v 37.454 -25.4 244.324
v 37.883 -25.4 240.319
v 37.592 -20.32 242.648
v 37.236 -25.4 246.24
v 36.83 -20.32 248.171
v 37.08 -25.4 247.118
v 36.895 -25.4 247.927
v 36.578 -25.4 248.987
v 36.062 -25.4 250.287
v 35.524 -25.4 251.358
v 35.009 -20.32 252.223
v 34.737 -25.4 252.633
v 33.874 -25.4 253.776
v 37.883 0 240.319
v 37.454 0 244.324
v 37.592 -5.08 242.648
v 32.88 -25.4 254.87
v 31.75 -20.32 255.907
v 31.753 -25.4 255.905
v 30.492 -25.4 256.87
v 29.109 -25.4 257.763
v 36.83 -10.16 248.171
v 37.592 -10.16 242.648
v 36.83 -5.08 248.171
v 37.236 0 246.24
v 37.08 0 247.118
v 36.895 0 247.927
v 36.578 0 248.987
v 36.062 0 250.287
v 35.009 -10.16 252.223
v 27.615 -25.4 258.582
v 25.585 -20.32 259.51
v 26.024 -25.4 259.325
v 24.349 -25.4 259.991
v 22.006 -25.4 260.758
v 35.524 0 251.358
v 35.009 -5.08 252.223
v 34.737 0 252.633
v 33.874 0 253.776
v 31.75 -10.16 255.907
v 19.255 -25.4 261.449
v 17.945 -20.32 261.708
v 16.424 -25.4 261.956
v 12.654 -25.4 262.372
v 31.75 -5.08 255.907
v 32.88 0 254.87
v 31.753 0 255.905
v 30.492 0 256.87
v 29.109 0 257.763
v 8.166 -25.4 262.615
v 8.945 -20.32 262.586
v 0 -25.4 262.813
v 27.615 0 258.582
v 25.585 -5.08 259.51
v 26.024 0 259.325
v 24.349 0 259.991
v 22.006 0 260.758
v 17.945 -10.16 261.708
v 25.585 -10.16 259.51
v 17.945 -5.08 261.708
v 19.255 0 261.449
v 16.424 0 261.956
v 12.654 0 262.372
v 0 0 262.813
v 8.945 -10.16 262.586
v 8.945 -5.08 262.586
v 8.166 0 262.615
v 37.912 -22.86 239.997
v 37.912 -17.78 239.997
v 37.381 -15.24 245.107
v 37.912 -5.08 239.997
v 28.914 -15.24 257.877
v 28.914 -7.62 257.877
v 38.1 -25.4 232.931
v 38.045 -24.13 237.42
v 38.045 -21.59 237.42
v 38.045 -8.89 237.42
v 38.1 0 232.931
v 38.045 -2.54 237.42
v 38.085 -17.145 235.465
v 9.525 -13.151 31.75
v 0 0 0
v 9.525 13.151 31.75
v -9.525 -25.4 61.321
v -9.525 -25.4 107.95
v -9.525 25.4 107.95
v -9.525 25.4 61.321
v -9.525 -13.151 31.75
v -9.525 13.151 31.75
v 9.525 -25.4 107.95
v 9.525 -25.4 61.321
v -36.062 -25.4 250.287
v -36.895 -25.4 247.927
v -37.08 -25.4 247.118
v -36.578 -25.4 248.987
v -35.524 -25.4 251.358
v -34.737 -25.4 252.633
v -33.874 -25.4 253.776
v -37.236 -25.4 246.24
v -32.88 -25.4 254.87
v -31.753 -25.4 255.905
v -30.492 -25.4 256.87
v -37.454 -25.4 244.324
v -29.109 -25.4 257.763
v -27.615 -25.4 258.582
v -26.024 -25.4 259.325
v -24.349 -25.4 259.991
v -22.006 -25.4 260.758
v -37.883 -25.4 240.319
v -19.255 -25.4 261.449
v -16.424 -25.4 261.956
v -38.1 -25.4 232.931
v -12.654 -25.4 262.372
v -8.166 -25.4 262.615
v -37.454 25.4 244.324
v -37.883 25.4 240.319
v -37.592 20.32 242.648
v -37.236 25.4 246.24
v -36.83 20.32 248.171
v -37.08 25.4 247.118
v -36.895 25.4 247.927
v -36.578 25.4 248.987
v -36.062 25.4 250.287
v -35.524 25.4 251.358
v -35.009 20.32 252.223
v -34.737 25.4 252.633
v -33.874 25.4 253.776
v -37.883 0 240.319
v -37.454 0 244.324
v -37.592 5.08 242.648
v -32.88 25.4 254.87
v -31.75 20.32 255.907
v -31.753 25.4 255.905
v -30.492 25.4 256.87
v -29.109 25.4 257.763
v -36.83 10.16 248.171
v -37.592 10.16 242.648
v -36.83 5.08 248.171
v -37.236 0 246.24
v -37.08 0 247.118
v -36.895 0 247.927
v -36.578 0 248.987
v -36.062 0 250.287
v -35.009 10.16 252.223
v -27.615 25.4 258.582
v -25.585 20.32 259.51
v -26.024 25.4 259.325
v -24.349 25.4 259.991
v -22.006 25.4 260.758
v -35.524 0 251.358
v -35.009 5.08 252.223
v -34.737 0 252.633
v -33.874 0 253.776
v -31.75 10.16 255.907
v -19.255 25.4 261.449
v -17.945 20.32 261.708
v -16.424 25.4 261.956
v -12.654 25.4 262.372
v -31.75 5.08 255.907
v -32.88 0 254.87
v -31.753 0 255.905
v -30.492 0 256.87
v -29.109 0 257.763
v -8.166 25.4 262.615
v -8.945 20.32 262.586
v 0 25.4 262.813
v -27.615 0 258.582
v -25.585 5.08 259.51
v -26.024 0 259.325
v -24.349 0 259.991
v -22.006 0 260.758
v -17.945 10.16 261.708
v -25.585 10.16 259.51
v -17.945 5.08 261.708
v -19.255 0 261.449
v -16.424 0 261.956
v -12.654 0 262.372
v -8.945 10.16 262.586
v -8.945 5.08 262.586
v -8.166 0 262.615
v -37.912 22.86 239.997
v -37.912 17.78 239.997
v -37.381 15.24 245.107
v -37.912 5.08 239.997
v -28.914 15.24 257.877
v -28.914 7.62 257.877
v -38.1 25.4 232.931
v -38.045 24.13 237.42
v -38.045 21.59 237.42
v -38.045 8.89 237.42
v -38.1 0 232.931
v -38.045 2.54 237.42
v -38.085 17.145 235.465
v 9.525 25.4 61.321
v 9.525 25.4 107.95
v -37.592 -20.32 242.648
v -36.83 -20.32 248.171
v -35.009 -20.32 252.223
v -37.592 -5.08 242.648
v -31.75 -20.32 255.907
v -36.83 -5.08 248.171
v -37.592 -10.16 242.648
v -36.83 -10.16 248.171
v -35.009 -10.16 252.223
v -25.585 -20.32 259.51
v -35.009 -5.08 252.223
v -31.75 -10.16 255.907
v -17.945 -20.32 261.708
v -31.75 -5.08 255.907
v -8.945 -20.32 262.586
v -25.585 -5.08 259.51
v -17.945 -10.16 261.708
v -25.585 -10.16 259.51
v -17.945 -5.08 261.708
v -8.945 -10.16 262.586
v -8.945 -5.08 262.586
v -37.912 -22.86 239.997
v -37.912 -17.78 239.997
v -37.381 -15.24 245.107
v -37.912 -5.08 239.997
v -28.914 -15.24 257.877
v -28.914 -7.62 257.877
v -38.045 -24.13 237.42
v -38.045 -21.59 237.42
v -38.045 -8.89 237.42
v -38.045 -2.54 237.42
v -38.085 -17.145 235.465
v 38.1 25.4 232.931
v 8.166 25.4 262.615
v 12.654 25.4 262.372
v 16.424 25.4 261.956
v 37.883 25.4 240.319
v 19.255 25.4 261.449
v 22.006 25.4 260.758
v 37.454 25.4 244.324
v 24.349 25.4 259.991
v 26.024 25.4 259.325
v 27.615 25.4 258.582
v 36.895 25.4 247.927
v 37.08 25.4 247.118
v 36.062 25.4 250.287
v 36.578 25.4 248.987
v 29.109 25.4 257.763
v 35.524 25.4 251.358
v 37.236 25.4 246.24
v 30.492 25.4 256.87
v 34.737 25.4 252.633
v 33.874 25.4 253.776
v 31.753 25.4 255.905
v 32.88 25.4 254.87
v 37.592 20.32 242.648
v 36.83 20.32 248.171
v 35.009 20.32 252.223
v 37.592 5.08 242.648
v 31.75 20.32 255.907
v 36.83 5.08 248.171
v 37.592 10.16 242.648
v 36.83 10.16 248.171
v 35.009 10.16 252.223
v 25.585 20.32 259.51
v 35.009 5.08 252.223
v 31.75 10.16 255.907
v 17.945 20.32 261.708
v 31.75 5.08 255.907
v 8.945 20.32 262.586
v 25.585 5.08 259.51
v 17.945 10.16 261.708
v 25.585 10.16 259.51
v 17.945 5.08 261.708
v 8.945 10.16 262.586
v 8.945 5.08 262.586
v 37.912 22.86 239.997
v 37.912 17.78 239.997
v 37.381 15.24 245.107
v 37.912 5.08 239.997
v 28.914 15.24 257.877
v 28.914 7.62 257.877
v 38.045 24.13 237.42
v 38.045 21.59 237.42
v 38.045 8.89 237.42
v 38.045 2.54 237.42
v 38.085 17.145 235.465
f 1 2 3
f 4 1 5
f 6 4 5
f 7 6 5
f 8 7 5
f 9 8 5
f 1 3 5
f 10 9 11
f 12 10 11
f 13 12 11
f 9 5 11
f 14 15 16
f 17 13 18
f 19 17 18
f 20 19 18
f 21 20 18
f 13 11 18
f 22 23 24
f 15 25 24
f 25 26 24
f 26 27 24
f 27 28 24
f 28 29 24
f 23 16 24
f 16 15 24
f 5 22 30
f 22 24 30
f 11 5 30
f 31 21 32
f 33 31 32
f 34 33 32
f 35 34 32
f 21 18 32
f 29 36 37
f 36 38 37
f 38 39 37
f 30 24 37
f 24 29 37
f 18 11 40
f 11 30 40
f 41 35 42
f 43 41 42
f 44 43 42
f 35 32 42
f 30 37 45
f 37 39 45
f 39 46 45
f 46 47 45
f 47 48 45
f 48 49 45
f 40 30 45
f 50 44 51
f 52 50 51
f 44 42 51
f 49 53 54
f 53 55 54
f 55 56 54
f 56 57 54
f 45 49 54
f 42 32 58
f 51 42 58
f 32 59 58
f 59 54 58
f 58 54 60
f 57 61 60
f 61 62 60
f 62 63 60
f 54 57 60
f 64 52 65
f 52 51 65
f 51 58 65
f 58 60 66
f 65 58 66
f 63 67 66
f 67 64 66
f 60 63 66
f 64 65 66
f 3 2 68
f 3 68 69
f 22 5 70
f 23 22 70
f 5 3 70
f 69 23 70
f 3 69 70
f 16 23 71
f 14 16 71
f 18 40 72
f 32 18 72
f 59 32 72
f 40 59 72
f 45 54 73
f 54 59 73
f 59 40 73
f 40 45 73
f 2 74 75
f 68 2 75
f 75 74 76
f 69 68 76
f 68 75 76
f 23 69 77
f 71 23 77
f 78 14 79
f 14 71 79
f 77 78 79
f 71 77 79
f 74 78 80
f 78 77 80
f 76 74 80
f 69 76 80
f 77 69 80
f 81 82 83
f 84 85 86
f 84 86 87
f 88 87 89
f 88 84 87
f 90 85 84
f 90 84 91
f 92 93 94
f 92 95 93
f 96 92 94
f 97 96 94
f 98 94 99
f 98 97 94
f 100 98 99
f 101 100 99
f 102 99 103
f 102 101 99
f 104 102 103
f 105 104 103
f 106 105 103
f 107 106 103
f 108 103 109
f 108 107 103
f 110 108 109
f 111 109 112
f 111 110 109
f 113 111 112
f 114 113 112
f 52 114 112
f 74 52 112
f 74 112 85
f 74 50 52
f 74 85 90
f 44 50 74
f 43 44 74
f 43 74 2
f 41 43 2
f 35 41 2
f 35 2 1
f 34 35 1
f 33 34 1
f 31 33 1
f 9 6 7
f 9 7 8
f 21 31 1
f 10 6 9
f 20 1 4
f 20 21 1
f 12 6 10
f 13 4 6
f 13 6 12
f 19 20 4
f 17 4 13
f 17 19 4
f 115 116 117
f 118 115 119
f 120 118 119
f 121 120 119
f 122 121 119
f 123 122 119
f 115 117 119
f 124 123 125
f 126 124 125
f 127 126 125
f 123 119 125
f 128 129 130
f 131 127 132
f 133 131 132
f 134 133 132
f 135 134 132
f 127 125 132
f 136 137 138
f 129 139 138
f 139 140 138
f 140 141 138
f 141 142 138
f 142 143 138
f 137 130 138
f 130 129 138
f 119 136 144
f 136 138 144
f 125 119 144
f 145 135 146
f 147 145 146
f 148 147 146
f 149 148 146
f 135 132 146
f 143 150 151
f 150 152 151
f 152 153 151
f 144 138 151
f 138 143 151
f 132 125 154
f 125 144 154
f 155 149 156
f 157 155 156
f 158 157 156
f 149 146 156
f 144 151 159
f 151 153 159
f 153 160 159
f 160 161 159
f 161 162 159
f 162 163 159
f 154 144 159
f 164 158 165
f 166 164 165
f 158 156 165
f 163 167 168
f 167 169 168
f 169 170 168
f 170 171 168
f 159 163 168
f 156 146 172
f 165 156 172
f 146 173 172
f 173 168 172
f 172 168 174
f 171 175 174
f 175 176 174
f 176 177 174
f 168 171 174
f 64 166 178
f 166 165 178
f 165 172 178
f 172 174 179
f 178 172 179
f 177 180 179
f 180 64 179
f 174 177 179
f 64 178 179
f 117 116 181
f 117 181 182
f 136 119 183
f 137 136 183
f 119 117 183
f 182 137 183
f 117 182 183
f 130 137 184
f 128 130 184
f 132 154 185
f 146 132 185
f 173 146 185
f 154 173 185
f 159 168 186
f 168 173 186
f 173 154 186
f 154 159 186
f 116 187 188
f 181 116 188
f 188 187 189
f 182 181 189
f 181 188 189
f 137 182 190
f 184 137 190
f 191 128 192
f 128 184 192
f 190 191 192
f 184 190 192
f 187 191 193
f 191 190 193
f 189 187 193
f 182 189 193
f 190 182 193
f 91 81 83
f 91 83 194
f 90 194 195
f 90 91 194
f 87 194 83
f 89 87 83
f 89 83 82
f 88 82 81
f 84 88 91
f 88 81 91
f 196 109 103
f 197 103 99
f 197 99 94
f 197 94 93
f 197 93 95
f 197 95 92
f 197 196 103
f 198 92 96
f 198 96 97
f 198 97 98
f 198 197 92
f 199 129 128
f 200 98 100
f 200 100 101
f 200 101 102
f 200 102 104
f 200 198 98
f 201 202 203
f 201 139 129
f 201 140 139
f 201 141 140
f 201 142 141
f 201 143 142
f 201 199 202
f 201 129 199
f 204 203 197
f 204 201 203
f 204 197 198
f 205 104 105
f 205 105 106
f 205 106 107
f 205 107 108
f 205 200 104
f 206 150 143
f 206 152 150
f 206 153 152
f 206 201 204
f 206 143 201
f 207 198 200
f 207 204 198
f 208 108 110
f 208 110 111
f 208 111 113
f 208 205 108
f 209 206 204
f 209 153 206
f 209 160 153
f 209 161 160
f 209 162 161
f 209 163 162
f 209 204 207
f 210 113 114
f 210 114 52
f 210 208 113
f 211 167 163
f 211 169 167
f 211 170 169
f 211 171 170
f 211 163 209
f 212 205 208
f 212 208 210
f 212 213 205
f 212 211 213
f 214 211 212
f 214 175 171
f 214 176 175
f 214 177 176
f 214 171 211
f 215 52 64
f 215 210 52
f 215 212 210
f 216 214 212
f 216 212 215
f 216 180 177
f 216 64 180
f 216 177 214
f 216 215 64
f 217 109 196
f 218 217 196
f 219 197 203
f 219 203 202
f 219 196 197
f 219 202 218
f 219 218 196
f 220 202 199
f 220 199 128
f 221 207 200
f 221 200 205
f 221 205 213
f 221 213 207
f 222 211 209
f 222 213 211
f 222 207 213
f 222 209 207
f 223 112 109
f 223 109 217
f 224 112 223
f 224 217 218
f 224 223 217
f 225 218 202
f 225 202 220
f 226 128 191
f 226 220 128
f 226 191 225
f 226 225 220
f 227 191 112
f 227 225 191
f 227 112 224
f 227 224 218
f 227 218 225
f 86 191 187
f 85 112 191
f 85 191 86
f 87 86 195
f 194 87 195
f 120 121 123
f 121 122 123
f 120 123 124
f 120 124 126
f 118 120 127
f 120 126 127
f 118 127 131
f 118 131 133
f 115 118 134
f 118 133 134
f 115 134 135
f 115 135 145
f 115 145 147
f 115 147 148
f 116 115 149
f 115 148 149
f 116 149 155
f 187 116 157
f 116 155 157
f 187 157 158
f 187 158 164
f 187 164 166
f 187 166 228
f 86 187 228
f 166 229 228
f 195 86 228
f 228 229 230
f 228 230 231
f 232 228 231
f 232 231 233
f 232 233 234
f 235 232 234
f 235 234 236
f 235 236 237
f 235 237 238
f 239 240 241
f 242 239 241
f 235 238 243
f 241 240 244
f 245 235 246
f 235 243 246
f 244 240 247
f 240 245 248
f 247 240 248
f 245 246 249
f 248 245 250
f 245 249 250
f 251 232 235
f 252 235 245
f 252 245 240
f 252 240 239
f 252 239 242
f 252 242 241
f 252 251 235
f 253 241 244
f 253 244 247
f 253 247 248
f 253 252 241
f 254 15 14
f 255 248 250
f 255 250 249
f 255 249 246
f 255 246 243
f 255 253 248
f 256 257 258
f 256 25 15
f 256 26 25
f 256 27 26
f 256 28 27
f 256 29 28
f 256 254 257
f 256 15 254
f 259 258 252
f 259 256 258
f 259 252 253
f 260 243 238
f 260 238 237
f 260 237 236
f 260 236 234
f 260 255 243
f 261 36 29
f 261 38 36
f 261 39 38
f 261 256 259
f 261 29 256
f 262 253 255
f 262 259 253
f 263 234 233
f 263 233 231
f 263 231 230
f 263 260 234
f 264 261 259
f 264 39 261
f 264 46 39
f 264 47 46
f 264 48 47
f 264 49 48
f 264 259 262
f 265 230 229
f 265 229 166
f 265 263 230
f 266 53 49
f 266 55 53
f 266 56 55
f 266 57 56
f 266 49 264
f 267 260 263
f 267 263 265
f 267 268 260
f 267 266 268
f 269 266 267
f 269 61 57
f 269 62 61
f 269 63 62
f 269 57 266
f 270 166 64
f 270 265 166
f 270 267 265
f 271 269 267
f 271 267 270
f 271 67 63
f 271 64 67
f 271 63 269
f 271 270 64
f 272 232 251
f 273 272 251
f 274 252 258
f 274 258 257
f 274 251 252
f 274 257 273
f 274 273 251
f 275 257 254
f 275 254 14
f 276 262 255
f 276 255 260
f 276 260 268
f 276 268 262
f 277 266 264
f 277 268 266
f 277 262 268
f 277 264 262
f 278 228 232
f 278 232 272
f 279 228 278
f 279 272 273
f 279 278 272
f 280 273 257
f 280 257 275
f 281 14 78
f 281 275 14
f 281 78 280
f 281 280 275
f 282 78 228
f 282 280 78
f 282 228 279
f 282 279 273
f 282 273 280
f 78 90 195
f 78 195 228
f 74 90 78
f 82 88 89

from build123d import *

# Parameters (mm, degrees)
F1_DEPTH = 25.4
F3_DEPTH = 25.4


with BuildPart() as f1:
    # F0 (on Front) → F1 (new body, symmetric)
    with BuildSketch(Plane.XZ):
        with BuildLine():
            Line((-38.1, 232.930787788), (-9.525, 107.95))
            Line((-9.525, 107.95), (-9.525, 31.75))
            Line((-9.525, 31.75), (0, 0))
            Line((0, 0), (9.525, 31.75))
            Line((9.525, 31.75), (9.525, 107.95))
            Line((9.525, 107.95), (38.1, 232.930787788))
            add(Edge.make_bspline(
                [(38.1, 232.930787788), (38.1, 240.550787788), (37.5163115662, 241.1928509419), (37.3595791728, 248.750210884), (32.3169404592, 257.1928484496), (17.7830254248, 262.9110086651), (5.8041372503, 262.6187246427), (0, 262.8126600247)],
                knots=[0, 0, 0, 0, 0.1875465373, 0.3295066438, 0.5124130237, 0.74506917, 1, 1, 1, 1], degree=3))
            add(Edge.make_bspline(
                [(-38.1, 232.930787788), (-38.1, 240.550787788), (-37.5163115662, 241.1928509419), (-37.3595791728, 248.750210884), (-32.3169404592, 257.1928484496), (-17.7830254248, 262.9110086651), (-5.8041372503, 262.6187246427), (0, 262.8126600247)],
                knots=[0, 0, 0, 0, 0.1875465373, 0.3295066438, 0.5124130237, 0.74506917, 1, 1, 1, 1], degree=3))
        make_face()
    extrude(amount=F1_DEPTH, both=True)


with BuildPart() as f3:
    # F2 (on Right) → F3 (new body, symmetric)
    with BuildSketch(Plane.YZ):
        Polygon((29.1604775462, 70.3996203774), (0, 0), (-29.1604775462, 70.3996203774), (-87.4900998982, 70.3996203774), (-87.4900998982, -68.1293379466), (87.4900998982, -68.1293379466), (87.4900998982, 70.3996203774), align=None)
    extrude(amount=F3_DEPTH, both=True)


with BuildPart() as f1_1:
    add(f1.part)

    # F4: cut F3
    add(f3.part, mode=Mode.SUBTRACT)


solid = f1_1.part
